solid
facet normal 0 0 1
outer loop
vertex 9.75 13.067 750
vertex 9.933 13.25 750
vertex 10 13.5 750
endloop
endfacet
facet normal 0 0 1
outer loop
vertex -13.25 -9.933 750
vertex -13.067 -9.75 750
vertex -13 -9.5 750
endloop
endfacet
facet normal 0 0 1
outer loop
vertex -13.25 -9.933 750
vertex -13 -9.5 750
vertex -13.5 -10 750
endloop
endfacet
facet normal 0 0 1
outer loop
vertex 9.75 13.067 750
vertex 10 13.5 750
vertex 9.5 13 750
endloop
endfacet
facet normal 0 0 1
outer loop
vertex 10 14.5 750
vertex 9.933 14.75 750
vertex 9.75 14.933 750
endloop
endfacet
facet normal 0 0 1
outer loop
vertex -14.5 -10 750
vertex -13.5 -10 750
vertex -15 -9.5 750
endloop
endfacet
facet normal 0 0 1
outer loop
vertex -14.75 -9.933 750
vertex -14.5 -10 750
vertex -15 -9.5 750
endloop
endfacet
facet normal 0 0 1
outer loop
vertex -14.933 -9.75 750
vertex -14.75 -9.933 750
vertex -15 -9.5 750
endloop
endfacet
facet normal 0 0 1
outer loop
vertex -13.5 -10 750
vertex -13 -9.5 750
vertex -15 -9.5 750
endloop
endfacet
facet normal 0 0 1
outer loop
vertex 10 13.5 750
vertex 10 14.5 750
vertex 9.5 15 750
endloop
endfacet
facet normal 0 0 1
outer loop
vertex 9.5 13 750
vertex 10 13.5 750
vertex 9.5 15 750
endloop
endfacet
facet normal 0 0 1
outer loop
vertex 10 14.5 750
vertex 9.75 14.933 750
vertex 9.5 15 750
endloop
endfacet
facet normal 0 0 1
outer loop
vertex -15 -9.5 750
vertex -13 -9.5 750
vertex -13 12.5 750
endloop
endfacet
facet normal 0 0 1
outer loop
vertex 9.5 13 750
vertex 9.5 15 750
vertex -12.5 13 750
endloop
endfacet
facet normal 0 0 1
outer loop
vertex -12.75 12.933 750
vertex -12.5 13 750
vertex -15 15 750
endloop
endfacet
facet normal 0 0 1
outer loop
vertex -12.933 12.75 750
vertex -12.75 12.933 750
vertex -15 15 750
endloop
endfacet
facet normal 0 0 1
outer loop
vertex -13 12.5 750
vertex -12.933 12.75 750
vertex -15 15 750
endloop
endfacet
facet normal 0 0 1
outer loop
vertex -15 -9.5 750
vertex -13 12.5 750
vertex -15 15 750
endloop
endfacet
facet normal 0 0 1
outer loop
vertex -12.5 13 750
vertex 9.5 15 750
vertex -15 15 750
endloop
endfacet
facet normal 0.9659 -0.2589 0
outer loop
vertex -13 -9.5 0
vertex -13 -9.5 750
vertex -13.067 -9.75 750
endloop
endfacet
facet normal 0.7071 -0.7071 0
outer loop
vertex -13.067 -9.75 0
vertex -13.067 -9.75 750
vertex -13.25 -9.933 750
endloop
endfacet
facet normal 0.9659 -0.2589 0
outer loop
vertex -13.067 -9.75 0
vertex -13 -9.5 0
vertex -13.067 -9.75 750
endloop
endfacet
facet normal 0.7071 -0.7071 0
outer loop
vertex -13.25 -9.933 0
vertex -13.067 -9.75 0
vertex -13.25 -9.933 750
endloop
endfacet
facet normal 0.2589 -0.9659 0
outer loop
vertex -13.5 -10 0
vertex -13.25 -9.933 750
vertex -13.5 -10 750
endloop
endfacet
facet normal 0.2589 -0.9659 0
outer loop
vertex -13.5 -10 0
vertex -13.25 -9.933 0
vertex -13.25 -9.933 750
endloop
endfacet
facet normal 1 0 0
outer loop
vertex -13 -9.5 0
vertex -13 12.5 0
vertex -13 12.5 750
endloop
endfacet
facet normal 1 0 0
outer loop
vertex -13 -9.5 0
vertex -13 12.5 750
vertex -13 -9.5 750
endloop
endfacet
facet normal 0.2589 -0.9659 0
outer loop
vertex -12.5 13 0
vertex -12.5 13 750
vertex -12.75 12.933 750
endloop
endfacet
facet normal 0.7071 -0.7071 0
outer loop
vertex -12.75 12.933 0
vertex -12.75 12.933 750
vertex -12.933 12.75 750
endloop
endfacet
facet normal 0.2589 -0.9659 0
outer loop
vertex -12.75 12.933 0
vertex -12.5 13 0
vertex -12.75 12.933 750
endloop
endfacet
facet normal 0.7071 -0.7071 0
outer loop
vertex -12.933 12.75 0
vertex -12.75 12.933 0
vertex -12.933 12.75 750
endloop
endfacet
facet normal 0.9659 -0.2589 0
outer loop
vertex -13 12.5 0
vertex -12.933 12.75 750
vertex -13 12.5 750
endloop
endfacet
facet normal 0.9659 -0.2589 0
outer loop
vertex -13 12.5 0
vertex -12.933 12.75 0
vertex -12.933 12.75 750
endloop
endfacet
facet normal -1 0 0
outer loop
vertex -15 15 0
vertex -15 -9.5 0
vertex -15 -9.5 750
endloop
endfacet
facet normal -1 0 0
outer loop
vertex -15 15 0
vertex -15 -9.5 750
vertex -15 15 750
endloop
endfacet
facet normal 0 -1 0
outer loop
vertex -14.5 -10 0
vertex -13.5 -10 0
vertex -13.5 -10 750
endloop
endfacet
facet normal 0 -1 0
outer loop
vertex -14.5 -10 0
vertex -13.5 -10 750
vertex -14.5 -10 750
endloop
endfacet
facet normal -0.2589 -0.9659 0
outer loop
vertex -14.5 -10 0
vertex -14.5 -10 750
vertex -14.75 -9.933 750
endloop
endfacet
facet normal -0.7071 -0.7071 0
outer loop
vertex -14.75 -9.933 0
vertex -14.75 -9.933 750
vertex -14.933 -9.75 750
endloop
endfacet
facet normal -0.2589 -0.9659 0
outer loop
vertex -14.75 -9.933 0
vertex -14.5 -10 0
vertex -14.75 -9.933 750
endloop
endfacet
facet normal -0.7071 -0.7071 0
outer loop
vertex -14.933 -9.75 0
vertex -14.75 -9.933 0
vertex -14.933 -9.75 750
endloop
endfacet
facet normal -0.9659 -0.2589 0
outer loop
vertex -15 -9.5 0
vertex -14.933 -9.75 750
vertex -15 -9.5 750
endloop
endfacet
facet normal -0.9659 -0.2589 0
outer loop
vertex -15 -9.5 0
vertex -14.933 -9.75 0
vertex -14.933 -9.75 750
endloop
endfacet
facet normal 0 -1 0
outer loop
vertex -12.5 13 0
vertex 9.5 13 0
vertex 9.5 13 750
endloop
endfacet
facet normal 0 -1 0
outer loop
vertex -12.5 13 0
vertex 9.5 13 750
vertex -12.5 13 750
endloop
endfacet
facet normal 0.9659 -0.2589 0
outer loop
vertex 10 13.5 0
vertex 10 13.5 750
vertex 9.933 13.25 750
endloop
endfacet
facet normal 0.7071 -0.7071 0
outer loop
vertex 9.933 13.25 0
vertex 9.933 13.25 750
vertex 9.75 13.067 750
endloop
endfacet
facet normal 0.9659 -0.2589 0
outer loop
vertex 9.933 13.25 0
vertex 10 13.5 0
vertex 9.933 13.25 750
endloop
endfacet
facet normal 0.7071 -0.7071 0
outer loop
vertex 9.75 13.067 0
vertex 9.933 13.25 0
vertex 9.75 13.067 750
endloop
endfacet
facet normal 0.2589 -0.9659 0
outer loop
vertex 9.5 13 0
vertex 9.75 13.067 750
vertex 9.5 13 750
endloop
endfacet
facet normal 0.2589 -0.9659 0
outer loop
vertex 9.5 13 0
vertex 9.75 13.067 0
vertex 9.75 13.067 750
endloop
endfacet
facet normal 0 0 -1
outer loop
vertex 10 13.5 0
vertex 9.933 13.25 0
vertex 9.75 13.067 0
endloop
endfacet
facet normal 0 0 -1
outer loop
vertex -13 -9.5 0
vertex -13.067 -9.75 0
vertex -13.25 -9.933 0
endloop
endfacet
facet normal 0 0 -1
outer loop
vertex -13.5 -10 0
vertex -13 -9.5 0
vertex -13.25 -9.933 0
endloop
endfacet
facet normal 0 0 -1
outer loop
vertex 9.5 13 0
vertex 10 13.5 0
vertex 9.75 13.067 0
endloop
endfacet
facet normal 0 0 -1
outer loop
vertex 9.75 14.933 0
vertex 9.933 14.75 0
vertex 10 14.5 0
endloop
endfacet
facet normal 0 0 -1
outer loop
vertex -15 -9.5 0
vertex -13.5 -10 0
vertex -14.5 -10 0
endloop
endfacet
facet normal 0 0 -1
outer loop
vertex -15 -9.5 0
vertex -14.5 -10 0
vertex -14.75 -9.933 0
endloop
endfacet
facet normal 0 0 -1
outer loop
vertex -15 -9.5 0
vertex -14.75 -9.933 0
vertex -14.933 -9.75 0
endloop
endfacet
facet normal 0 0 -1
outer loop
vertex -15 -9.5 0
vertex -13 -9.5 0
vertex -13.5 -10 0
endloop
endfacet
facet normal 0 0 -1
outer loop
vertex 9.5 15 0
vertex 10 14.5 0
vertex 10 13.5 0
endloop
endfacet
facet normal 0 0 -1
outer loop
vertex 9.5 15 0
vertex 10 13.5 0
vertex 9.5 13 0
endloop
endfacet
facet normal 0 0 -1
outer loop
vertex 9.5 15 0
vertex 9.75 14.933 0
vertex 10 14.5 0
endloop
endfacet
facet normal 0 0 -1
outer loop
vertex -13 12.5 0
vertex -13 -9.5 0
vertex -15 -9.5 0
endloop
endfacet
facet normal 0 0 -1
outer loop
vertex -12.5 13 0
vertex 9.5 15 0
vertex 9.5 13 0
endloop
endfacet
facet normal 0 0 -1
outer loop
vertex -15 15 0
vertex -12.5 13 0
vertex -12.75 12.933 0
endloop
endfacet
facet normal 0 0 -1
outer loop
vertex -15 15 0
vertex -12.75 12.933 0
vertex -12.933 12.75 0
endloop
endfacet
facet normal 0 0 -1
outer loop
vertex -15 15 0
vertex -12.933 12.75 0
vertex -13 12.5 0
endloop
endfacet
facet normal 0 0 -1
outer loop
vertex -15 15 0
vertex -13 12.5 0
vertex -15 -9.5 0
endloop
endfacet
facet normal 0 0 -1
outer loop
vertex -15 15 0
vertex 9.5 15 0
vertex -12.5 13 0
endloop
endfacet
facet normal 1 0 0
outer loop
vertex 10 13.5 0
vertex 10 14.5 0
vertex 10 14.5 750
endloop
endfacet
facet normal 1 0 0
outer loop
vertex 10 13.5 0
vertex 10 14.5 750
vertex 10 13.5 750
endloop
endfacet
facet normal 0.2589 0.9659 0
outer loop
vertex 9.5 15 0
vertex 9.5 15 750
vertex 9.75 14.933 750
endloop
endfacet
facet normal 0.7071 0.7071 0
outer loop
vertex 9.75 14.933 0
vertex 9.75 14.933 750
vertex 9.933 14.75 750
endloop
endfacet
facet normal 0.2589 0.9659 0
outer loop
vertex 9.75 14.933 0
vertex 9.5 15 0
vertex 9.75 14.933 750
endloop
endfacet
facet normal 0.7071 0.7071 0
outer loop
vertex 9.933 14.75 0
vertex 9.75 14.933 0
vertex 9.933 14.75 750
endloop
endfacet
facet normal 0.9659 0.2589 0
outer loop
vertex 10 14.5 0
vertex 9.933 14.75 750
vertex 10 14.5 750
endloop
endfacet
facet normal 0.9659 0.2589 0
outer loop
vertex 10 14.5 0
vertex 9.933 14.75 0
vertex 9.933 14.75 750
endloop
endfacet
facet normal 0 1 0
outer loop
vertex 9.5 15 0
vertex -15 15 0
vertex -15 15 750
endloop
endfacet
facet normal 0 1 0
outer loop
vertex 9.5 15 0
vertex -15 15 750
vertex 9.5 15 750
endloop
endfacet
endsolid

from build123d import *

# Parameters (mm, degrees)
EXTRUDE_1_DEPTH = 750


with BuildPart() as part:
    # Эскиз1 → Бобышка-Вытянуть1 (new body)
    with BuildSketch(Plane.XY):
        with BuildLine():
            Line((10, 14.5), (10, 13.5))
            ThreePointArc((10, 13.5), (9.853553391, 13.146446609), (9.5, 13))
            Line((9.5, 13), (-12.5, 13))
            ThreePointArc((-12.5, 13), (-12.853553391, 12.853553391), (-13, 12.5))
            Line((-13, 12.5), (-13, -9.5))
            ThreePointArc((-13, -9.5), (-13.146446609, -9.853553391), (-13.5, -10))
            Line((-13.5, -10), (-14.5, -10))
            ThreePointArc((-14.5, -10), (-14.853553391, -9.853553391), (-15, -9.5))
            Line((-15, -9.5), (-15, 15))
            Line((-15, 15), (9.5, 15))
            ThreePointArc((9.5, 15), (9.853553391, 14.853553391), (10, 14.5))
        make_face()
    extrude(amount=EXTRUDE_1_DEPTH)


solid = part.part
